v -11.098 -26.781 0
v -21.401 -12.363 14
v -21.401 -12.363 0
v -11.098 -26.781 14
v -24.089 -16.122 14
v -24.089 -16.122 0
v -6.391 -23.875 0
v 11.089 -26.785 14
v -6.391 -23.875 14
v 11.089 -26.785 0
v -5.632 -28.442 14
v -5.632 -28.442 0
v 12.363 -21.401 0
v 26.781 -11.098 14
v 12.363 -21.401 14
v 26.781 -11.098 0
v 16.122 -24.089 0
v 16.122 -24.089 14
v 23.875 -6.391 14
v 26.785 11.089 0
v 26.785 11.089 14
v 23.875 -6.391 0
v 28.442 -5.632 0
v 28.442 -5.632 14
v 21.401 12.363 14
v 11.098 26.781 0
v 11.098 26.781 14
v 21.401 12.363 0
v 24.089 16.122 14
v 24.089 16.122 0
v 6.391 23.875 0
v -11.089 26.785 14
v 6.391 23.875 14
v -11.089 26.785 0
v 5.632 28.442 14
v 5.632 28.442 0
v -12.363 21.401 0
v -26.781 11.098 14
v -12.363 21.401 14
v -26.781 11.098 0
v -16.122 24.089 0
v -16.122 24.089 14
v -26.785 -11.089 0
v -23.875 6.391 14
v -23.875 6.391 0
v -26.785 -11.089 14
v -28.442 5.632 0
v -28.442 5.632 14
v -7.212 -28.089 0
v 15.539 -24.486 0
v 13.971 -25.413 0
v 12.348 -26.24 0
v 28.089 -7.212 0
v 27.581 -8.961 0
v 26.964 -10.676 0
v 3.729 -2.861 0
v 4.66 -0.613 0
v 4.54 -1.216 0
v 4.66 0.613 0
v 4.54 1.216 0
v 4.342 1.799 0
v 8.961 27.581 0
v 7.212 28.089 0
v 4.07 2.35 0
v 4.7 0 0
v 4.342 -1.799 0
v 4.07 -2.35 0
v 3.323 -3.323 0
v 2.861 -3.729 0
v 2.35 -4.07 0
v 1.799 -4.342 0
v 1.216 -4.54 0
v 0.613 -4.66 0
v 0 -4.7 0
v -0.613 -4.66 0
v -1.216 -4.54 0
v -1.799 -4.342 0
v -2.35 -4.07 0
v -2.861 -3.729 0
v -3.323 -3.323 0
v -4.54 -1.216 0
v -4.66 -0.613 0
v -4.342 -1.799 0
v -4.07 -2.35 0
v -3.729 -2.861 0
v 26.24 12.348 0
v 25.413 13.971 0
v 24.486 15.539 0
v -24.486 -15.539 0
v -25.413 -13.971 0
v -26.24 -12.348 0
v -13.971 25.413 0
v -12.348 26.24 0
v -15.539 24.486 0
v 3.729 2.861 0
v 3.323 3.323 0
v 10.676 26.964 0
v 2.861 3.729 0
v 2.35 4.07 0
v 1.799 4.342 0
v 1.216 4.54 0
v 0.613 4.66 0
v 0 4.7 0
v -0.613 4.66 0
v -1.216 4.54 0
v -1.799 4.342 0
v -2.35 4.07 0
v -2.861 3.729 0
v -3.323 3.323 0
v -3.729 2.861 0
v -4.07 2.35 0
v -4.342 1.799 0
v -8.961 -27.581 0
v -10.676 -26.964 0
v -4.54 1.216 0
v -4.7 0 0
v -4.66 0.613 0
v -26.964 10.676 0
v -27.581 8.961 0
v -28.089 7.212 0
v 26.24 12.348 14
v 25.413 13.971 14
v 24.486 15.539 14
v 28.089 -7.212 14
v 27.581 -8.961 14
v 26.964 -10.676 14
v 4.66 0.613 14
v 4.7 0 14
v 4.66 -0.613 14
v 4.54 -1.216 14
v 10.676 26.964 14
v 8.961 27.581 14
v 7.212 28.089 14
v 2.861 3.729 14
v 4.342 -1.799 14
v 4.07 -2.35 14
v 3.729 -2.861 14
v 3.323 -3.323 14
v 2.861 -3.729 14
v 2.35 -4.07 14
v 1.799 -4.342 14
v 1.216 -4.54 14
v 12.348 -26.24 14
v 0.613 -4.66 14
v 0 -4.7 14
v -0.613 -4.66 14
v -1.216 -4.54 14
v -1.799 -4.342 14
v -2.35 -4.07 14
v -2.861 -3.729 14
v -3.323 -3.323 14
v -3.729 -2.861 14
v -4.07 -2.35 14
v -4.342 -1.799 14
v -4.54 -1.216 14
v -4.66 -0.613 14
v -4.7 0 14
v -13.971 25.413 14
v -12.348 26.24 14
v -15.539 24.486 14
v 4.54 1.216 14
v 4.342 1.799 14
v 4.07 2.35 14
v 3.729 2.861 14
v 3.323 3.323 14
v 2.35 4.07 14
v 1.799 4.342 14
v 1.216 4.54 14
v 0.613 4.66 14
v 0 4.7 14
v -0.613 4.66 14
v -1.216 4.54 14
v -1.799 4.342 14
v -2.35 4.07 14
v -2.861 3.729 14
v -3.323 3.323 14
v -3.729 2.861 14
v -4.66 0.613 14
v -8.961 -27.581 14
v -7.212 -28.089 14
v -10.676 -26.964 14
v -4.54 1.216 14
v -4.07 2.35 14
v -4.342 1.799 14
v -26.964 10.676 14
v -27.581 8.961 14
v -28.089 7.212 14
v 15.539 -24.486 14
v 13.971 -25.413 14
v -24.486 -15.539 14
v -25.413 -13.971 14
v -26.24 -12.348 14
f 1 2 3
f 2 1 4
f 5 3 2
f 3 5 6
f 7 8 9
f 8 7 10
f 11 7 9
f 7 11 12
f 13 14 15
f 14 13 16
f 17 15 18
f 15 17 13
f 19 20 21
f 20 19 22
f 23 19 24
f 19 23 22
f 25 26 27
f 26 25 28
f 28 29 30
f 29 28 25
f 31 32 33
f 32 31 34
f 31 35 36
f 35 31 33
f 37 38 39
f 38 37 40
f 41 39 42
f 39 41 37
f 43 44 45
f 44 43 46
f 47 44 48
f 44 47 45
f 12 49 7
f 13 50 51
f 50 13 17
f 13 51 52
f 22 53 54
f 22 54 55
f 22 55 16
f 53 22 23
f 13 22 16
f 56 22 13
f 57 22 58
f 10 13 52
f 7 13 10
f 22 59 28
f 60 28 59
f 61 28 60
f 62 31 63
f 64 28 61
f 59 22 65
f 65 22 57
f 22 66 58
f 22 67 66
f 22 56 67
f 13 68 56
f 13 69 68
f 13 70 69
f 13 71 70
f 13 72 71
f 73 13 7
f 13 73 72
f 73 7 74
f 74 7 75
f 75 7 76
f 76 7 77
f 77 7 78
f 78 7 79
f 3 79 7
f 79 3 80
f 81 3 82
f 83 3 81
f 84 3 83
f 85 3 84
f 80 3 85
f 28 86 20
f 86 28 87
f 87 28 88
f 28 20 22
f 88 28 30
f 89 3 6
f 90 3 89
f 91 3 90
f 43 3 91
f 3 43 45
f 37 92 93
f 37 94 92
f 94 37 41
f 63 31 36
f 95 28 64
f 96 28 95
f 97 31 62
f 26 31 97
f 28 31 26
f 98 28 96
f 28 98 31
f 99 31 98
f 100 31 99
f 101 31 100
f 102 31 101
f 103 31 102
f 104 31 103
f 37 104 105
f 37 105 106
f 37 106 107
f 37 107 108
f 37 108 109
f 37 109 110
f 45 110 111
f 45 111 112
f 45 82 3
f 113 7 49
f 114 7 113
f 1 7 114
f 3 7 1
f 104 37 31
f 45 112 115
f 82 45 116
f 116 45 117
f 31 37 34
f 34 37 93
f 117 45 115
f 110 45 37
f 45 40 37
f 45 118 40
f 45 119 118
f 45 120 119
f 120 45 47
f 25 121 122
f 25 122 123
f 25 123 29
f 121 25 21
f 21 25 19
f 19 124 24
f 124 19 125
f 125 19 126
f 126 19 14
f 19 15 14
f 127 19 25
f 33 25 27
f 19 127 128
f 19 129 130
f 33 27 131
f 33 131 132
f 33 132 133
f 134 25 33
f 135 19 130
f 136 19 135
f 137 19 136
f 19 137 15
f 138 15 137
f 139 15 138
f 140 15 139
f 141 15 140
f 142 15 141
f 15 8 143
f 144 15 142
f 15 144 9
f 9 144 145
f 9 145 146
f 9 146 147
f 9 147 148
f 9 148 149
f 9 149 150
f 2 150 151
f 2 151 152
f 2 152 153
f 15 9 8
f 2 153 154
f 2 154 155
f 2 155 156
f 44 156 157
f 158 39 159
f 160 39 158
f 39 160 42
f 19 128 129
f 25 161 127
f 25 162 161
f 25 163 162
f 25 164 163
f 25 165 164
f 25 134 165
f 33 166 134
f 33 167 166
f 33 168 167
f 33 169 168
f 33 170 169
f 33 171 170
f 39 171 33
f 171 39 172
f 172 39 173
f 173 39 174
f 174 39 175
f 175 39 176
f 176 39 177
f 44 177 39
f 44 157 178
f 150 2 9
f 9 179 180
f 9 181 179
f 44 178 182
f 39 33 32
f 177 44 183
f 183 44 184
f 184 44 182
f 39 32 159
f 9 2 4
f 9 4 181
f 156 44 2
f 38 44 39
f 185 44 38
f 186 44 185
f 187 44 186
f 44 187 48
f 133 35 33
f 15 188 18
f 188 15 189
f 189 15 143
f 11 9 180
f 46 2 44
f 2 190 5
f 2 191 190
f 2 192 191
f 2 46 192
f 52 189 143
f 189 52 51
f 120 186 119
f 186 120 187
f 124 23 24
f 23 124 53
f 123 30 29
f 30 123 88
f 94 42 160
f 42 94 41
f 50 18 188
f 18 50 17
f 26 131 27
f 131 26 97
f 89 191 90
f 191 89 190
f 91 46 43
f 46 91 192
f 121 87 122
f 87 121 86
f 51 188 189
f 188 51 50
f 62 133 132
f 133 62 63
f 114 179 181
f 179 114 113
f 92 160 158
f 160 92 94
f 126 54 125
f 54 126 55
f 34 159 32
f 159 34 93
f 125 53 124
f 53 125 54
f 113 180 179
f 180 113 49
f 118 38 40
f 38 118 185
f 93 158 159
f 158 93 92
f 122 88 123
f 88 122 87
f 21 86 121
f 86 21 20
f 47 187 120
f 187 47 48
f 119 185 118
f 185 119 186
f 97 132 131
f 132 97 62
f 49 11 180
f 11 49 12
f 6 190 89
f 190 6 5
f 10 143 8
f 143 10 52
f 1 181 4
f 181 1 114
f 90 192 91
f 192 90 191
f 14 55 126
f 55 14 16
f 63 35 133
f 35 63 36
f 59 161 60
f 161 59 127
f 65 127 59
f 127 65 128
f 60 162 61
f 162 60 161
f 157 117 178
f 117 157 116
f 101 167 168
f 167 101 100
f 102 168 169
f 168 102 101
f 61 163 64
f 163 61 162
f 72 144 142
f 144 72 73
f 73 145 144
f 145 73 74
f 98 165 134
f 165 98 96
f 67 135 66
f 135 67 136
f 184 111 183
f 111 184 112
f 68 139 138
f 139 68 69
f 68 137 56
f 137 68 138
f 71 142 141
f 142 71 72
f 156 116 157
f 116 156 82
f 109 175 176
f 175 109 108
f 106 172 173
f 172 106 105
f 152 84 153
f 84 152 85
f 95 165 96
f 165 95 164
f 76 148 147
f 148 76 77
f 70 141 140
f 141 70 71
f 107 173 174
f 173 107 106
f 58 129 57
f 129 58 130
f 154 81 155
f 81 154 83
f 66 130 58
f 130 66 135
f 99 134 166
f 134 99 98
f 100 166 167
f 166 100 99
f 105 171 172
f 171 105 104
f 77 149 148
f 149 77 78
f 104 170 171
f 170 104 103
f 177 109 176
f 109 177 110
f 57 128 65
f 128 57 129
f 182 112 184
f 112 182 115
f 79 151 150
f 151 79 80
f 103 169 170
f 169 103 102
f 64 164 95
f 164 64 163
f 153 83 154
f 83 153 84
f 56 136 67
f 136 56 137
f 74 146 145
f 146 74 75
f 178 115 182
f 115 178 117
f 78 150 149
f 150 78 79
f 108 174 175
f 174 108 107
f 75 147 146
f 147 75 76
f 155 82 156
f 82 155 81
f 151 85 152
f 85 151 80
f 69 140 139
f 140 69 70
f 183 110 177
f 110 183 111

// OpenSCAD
// file: ../lib/RatchetLib.scad
/* 
   Parametric ratchet mechanism library
   License: CC BY-NC-SA
   Version: 0.2
   Date: 2010-05-23
   By: rustedrobot

   Changelog:
   2012-02-05 - rustedrobot - added support for slant parameter which slants the ratchet teeth and arm faces to provide a basic interloc
*/


// =======================================================================
module inner_ratchet_ring(ratchet_direction, ring1_diameter, ring1_height, ring1_thickness, ring2_diameter, ring2_height, ring2_thickness, arms, arm_type, arm_head_width, arm_head_length, arm_height, teeth_multiple, tolerance, slant, facets) {
  teeth = arms*teeth_multiple;
  difference() {
    //union() {
    translate([0,0,ring1_height/2]) {
      cylinder(r=ring1_diameter/2, h=ring1_height, center=true, $fn=facets);
    }
    translate([0,0,ring1_height/2]) {
      cylinder(r=ring1_diameter/2-ring1_thickness, h=ring1_height*2, center=true, $fn=facets);
    }
    translate([0,0,0]) {
      //translate([0,0,ring1_height]/2) {
      for(i=[1:teeth]) {
        rotate([0,0,360/teeth*i]) {
          if (arm_type == "straight") {
            if (ratchet_direction == "clockwise") {
              straight_arm_cutout(arm_head_width, arm_head_length, arm_height, ring1_diameter, ring1_thickness, ring1_height, ring2_diameter, ring2_thickness, ring2_height, tolerance, slant, facets);
            }
            if (ratchet_direction == "counter-clockwise") {
              mirror() {
                straight_arm_cutout(arm_head_width, arm_head_length, arm_height, ring1_diameter, ring1_thickness, ring1_height, ring2_diameter, ring2_thickness, ring2_height, tolerance, slant, facets);
              }
            }
          }
          if (arm_type == "curved") {
            echo("Curved arms not yet implemented");
          }
        }
      }
    }
  }
}

module outer_ratchet_ring(ratchet_direction, ring1_diameter, ring1_height, ring1_thickness, ring2_diameter, ring2_height, ring2_thickness, arms, arm_type, arm_head_width, arm_head_length, arm_shaft_width, arm_height, tolerance, slant, facets) {
  union() {
    translate([0,0,ring2_height/2]) {
      difference() {
        cylinder(r=ring2_diameter/2, h=ring2_height, center=true, $fn=facets);
        cylinder(r=ring2_diameter/2-ring2_thickness, h=ring2_height+1, center=true, $fn=facets);
      }
    }

    translate([0,0,arm_height/2]) {
      arms(ratchet_direction, arms, arm_type, arm_head_width, arm_head_length, arm_shaft_width, arm_height, ring1_diameter, ring2_diameter, ring2_height, ring2_thickness, slant, facets);
    }
  }
}

module arms(ratchet_direction, arms, arm_type, arm_head_width, arm_head_length, arm_shaft_width, arm_height, ring1_diameter, ring2_diameter, ring2_height, ring2_thickness, slant, facets) {
  for(i=[1:arms]) {
    rotate([0,0,360/arms*i]) {
      if (arm_type == "straight") {
        if (ratchet_direction == "clockwise") {
          straight_arm(arm_head_width, arm_head_length, arm_shaft_width, arm_height, ring1_diameter, ring2_diameter,ring2_height, ring2_thickness, slant, facets);
        }
        if (ratchet_direction == "counter-clockwise") { 
          mirror() {
            straight_arm(arm_head_width, arm_head_length, arm_shaft_width, arm_height, ring1_diameter, ring2_diameter,ring2_height, ring2_thickness, slant, facets);
          }
        }
      }
      if (arm_type == "curved") {
        echo("Curved arms not yet implemented");
      }
    }
  }
}

module straight_arm(arm_head_width, arm_head_length, arm_shaft_width, arm_height, ring1_diameter, ring2_diameter, ring2_height, ring2_thickness, slant, facets) {
  sidec = ring2_diameter/2-ring2_thickness+arm_head_width/2;
  sideb = ring1_diameter/2;
  sidea = sqrt(abs(pow(sidec, 2) - pow(sideb, 2)));

  slant_move = tan(slant) * arm_height/2;

  difference() {
    translate([0,ring1_diameter/2-arm_head_width,-arm_height/2]) {
      //union() {
      difference() {
        union() {
          cube([sidea,arm_head_width,arm_height]);
          if (slant != 0) {
            translate([0,-arm_head_width+0.001,0]) {
              cube([arm_head_length,arm_head_width,arm_height]);
            }
          }
        }
        translate([0,-slant_move,-0.01]) {
          rotate([90-slant,0,0]) {
            cube([sidea,arm_head_width*10,arm_height*2]);
          }
        }
        translate([0,-arm_head_width*2-slant_move,0]) {
          cube([sidea*2,arm_head_width*2,arm_height*2]);
        }

        translate([arm_head_length+arm_head_width-arm_shaft_width,-0.1,-0.2]) {
          cube([sidea-(arm_head_length+arm_head_width-arm_shaft_width)+0.1,arm_head_width-arm_shaft_width+0.1,arm_height+0.5]);
        }
        translate([arm_head_length+arm_head_width-arm_shaft_width,0,-0.2]) {
          cylinder(r=arm_head_width-arm_shaft_width, h=arm_height+0.5, $fn=facets);
        }
      }
    }
    difference() {
      cylinder(r=ring2_diameter, h=ring2_height+0.1, center=true, $fn=facets);
      cylinder(r=ring2_diameter/2, h=ring2_height*2, center=true, $fn=facets);
    }
  }
}

module straight_arm_cutout(arm_head_width, arm_head_length, arm_height, ring1_diameter, ring1_thickness, ring1_height, ring2_diameter, ring2_thickness, ring2_height, tolerance, slant, facets) {
  sidec = ring2_diameter/2-ring2_thickness+arm_head_width/2;
  sideb = ring1_diameter/2;
  sidea = sqrt(abs(pow(sidec, 2) - pow(sideb, 2)));
  slant_move = tan(slant) * arm_height/2;
  slant_tolerance = tolerance/cos(abs(slant));

  translate([0,ring1_diameter/2-arm_head_width-slant_move-slant_tolerance,-0.01]) {
    rotate([-slant,0,0]) {
      cube([sidea,arm_head_width*2,arm_height*5]);
    }
  }
}
// file: ../lib/common.scad
// Common modules for use across models

epsilon=0.02;

module hollow_cylinder(h,d_inner,d_outer) {
  difference() {
    cylinder(h=h,d=d_outer);
    translate([0,0,-epsilon/2]) {
      cylinder(h=h+epsilon, d=d_inner);
    }
  }
}

module hollow_prism(h, lx_outer, lx_inner, ly_outer, ly_inner) {
  difference() {
    cube([lx_outer, ly_outer, h]);
    translate([(lx_outer-lx_inner)/2,(ly_outer-ly_inner)/2,-epsilon/2]) {
      cube([lx_inner, ly_inner,h+epsilon]);
    }
  }
}

module right_triangle(lx, ly) {
  polygon(points=[[0,0],
                  [lx,0],
                  [0,ly],
                  [0,0]]);
}

// A 2D rectangle with rounded corners
module rounded_rectangle(width, height, radius) {
  r = radius;
  x1 = r;
  y1 = r;
  x2 = width - r;
  y2 = height - r;
  hull() {
    translate([x1, y1, 0]) circle(radius);
    translate([x2, y1, 0]) circle(radius);
    translate([x1, y2, 0]) circle(radius);
    translate([x2, y2, 0]) circle(radius);
  }
}

// 3D rectangle with cylindrical rounded corners. Scale gives an optional flare to the top.
module rounded_prism(width, length, height, radius, scale=1) {
  translate([width/2, length/2]) {
    linear_extrude(height=height, scale=scale) {
      translate([-width/2, -length/2]) {
        rounded_rectangle(width, length, radius);
      }
    }
  }
}

// A squished sphere with the specified radii
module squashed_sphere(h_radius, v_radius) {
  resize([h_radius*2, h_radius*2, v_radius*2]) {
    sphere(r=h_radius);
  }
}

// 3D rectangle with spherical rounded corners
module pillowed_prism(width, length, height, h_radius, v_radius) {
  x1 = h_radius;
  y1 = x1;
  x2 = width - h_radius;
  y2 = length - h_radius;
  hull() {
    translate([x1, y1,  height/2-v_radius]) squashed_sphere(h_radius, v_radius);
    translate([x2, y1,  height/2-v_radius]) squashed_sphere(h_radius, v_radius);
    translate([x1, y2,  height/2-v_radius]) squashed_sphere(h_radius, v_radius);
    translate([x2, y2,  height/2-v_radius]) squashed_sphere(h_radius, v_radius);
    translate([x1, y1, -height/2+v_radius]) squashed_sphere(h_radius, v_radius);
    translate([x2, y1, -height/2+v_radius]) squashed_sphere(h_radius, v_radius);
    translate([x1, y2, -height/2+v_radius]) squashed_sphere(h_radius, v_radius);
    translate([x2, y2, -height/2+v_radius]) squashed_sphere(h_radius, v_radius);
  }
}

// Returns a volume that contains all of the points above or below the
// specified z
module xy(above, below)
{
  d = 10000;
  if (below == undef)
    translate([0,0,above+d/2]) cube([d,d,d] ,center=true);
  else
    translate([0,0,below-d/2]) cube([d,d,d], center=true);
}

// Lays things out in a line with labels
// TODO: Lay them out in a grid instead
module display(w, l=10, padding=2) {
  for (n = [0:2:$children-1]) {
    translate([(w + padding) * n/2, 0, 0]) {
      translate([0, l, 0]) {
        children(n+1);
      }
      color([0,0,0])
        children(n);
    }
  }
}

module quarter_cylinder(r, h) {
  difference() {
    translate([0,0,h/2]) {
      cylinder(r=r, h=h, center=true);
    }
    translate([-r*2-epsilon,-r*2,-epsilon]) {
      cube([r*2,r*4,h*2]);
    }
    translate([-r*2-epsilon,-r*2,-epsilon]) {
      cube([r*4,r*2,h*2]);
    }

  }
}

function bit_test(val, bit) = floor(val / (pow(2,bit))) % 2;

function inches(in) = in * 25.4;
// main file
include <../lib/common.scad>
use <../lib/RatchetLib.scad>;

$fn = 100;

extrusion_width = 0.4;
layer_height = 0.2;

// Caps
cap_thickness = 4;
cap_dimple_thickness = 1; // These mate with the sockets
cap_clearance_hole_d = 5.5;
cap_counterbore_thickness = 3;
cap_counterbore_d = 9;
flange_width = 25;
flange_thickness = 4;
flanges = -1;
flange_hole_diameter = 3;

// inner (teeth) ring
inner_ring_diameter=60;		// outer diameter of the inner ring
inner_ring_height=17;		// height of the inner ring

// outer (arms) ring
// outer_ring_diameter=110;		// outer diameter of the outer ring
///outer_ring_height=21;		// height of the outer ring
outer_ring_thickness=4;		// thickness of the outer ring
//outer_ring_brim_thickness = 2;

// arms for outer ring (and cutting ratchet teeth on inner ring)
arms=8;					// total number of radially symmetric arms
tooth_multiplier = 1;    // How many teeth there are per arm
axle_d = 12;
// arm_l = 15;
arm_w = 5;
arm_h = inner_ring_height;
arm_bevel = 20;

// spring arms
spring_thickness = extrusion_width * 2;

// sockets
socket_thickness=3;


// Computed values
// Make enough space for the arms to swing out without hitting the sockets
arm_clearance = 2.5;
outer_ring_r = (inner_ring_diameter / 2) 
  + arm_w + spring_thickness 
  + axle_d
  + socket_thickness
  + outer_ring_thickness
  + arm_clearance;
outer_ring_diameter = outer_ring_r * 2;

// Make the outer ring high enough to accomodate the cap
outer_ring_height = inner_ring_height + (cap_dimple_thickness * 2) + (layer_height * 2);

// Make the brim wide enough not to interfere with the arms
outer_ring_brim_w = axle_d / 2;

// Brim goes all the way to the top
outer_ring_brim_thickness = outer_ring_height;


// =======================================================================


/* module wedge( */
/*   theta1 = 0, */
/*   theta2 = 180, */
/*   r = 10, */
/*   $fn = $fn) { */
/*   points = [ */
/*     [0, 0], */
/*     for (a = [theta1:(theta2-theta1)/$fn:theta2]) */
/*       [r * cos(a), r * sin(a)] */
/*     , [0,0]]; */
/*   polygon(points=points); */
/* } */

// Set the arm length based on what gives a 90-degree power transfer angle
function optimimum_arm_length(
  outer_ring_diameter = outer_ring_diameter,
  outer_ring_thickness = outer_ring_thickness,
  axle_d = axle_d,
  arm_w = arm_w
  ) =
  let (c = (outer_ring_diameter / 2) - outer_ring_thickness - (axle_d / 2),
       a = (inner_ring_diameter / 2) - (arm_w / 2))
  sqrt((c * c) - (a * a)) - (axle_d / 2);

arm_l = optimimum_arm_length();

module arm (
  axle_d = axle_d,
  arm_l = arm_l,
  arm_w = arm_w,
  arm_h = arm_h,
  arm_bevel = arm_bevel) {
  union() {
    axle_r = axle_d / 2;
    // axle
    cylinder(h = arm_h, d = axle_d);
    // arm
    linear_extrude(height=arm_h) {
      polygon(points = [[arm_w/2, 0],
                        [arm_w/2, axle_r + arm_l + (arm_w * sin(arm_bevel))],
                        [-arm_w/2, axle_r + arm_l],
                        [-arm_w/2, 0]]);
    }
  }
}

// The angle at which the arm is closest to pointing to the center
function min_rotation(
  outer_ring_diameter = outer_ring_diameter,
  outer_ring_thickness = outer_ring_thickness,
  inner_ring_diameter = inner_ring_diameter,
  axle_d = axle_d,
  arm_l = arm_l,
  arm_w = arm_w,
  arm_h = arm_h,
  arm_bevel = arm_bevel) = 
  let (inner_ring_r = inner_ring_diameter / 2,
       outer_ring_r = outer_ring_diameter / 2,
       axle_r = axle_d / 2,
       a = inner_ring_r,
       b1 = arm_l + axle_r,
       b2 = arm_w / 2,
       b = sqrt((b1 * b1) + (b2 * b2)),
       c = outer_ring_r - outer_ring_thickness - axle_r,
       arm_angle = atan2(arm_w/2, arm_l + axle_r))
  acos(((b * b) + (c * c) - (a * a)) / (2 * b * c))- arm_angle;

function max_rotation(
  outer_ring_diameter = outer_ring_diameter,
  outer_ring_thickness = outer_ring_thickness,
  inner_ring_diameter = inner_ring_diameter,
  axle_d = axle_d,
  arm_l = arm_l,
  arm_w = arm_w,
  arm_h = arm_h,
  arm_bevel = arm_bevel) = 
  let (inner_ring_r = inner_ring_diameter / 2,
       outer_ring_r = outer_ring_diameter / 2,
       axle_r = axle_d / 2,
       a = inner_ring_r,
       b1 = arm_l + axle_r + (arm_w * sin(arm_bevel)),
       b2 = arm_w / 2,
       b = sqrt((b1 * b1) + (b2 * b2)),
       c = outer_ring_r - outer_ring_thickness - axle_r,
       arm_angle = atan2(arm_w/2, arm_l + axle_r + (arm_w * sin(arm_bevel))))
  acos(((b * b) + (c * c) - (a * a)) / (2 * b * c)) + arm_angle;

module nth_axle_transform(
  n, 
  arms=arms,
  outer_ring_diameter = outer_ring_diameter,
  outer_ring_thickness = outer_ring_thickness,
  axle_d=axle_d) {
  
  alpha = n * (360 / arms);
  rotate(alpha) {
    translate([0, -((outer_ring_diameter / 2) - outer_ring_thickness - (axle_d / 2)), 0]) {
      children();
    }
  }
}

module outer(
  axle_d = axle_d,
  arm_l = arm_l,
  arm_w = arm_w,
  arm_h = arm_h,
  arm_bevel = arm_bevel,
  socket_thickness = socket_thickness) {

  outer_ring_r = outer_ring_diameter / 2;
  axle_r = axle_d / 2;
  arm_center_offset = outer_ring_r - axle_d/2 - outer_ring_thickness;

  difference() {
    union() {
      color([1, 0, 0]) {
        union() {
          // Outer wall
          difference() {
            cylinder(d=outer_ring_diameter, h=outer_ring_height);
            translate([0,0,-1])
              cylinder(r=outer_ring_r-outer_ring_thickness, h=outer_ring_height + 2);
          }
          // base reinforcing brim
          difference() {
            cylinder(d = outer_ring_diameter, h = outer_ring_brim_thickness);
            translate([0, 0, -1]) {
              cylinder(r = outer_ring_r - outer_ring_thickness - outer_ring_brim_w, h = outer_ring_brim_thickness + 2);
            }
          }
        }
      }

      color([0, 0, 1]) {
        union() {
          // Spring
          for (n = [0:arms]) {
            nth_axle_transform(n) {

              rotate(min_rotation() - atan2(axle_r + socket_thickness - (arm_w / 2), arm_l + axle_r) - 90) {
                translate([-arm_l, -axle_d/2-socket_thickness, 0]) {
                  cube([arm_l, spring_thickness, outer_ring_height]);
                }
              }
            }
          }
          difference() {
            // Socket body
            for (n = [0:arms]) {
              nth_axle_transform(n) {
                cylinder(d = axle_d + (socket_thickness * 2), h=outer_ring_height);
              }
            }
            // Arm cutouts
            for (n = [0:arms]) {
              nth_axle_transform(n) {
                union() {
                  translate([0,0,-1]) {
                    rotate(min_rotation())
                      arm(arm_h = outer_ring_height + 2,
                          arm_w = arm_w + (extrusion_width * 2));
                  }
                  translate([0,0,-1]) {
                    rotate(max_rotation())
                      arm(arm_h = outer_ring_height + 2, 
                          arm_w = arm_w + (spring_thickness * 2));
                  }
                }
              }
            }
          }
        }
      }
    }
    //  Socket bores
    for (n = [0:arms]) {
      nth_axle_transform(n) {
        translate([0, 0, -1]) {
          cylinder(d = axle_d + (extrusion_width * 2), h=outer_ring_height + 2);
        }
      }
    }
  }
}


module nth_arm(
  n = 0,
  arms = arms,
  rotation=min_rotation(),
  arm_h = arm_h,
  arm_l = arm_l,
  arm_w = arm_w) {

  nth_axle_transform(n, arms=arms) {
    rotate([0, 0, rotation]) {
      arm(
        arm_h = arm_h,
        arm_l = arm_l,
        arm_w = arm_w);
    }
  }
}

module inner(
  inner_ring_diameter = inner_ring_diameter,
  inner_ring_height = inner_ring_height) {
  
  inner_ring_r = inner_ring_diameter / 2;
  
  color([1, 1, 0]) {
    difference() {
      cylinder(r = inner_ring_r, h = inner_ring_height);
      translate([0, 0, -1]) {
        for (n = [0:arms*tooth_multiplier]) {
          nth_arm(n,
                  arms = arms * tooth_multiplier,
                  arm_h = inner_ring_height + 2, 
                  arm_l = arm_l + extrusion_width,
                  arm_w = arm_w + extrusion_width * 2);
        }
      }
    }
  }
}

module cap(
  outer_ring_diameter = outer_ring_diameter,
  outer_ring_thickness = outer_ring_thickness,
  outer_ring_brim_thickness = outer_ring_brim_thickness,
  cap_thickness = cap_thickness,
  cap_dimple_thickness = cap_dimple_thickness,
  cap_clearance_hole_d = cap_clearance_hole_d,
  cap_counterbore_d = cap_counterbore_d,
  cap_counterbore_thickness = cap_counterbore_thickness,
  flanges = flanges,
  flange_width = flange_width,
  flange_thickness = flange_thickness,
  flange_hole_diameter = flange_hole_diameter
  ) {
  difference() {
    union() {
      cylinder(d = outer_ring_diameter, h = cap_thickness);
      // nubs
      for (n = [0:arms]) {
        nth_axle_transform(n) {
          cylinder(d=axle_d, h = cap_dimple_thickness + cap_thickness);
        }
      }
      // Flanges
      for (angle = [0:360/flanges:360]) {
        rotate([0,0,angle]) {
          difference() {
            translate([0, -flange_width / 2, 0]) {
              difference() {
                cube([flange_width + outer_ring_diameter / 2, flange_width,  flange_thickness]);
                translate([(flange_width + outer_ring_diameter)/2, flange_width/2, -0.05]) {
                  cylinder(d=flange_hole_diameter, h = flange_thickness + 0.1);
                }
              }
            }
            translate([0,0,-0.05]) {
              cylinder(d=outer_ring_diameter, h = outer_ring_height + 0.1);
            }
          }
        }
      }
    }
    for (n = [0:arms]) {
      rotate((n+0.5)*360/arms) {
        translate([0, 
                   (outer_ring_diameter/2) 
                   + outer_ring_thickness 
                   - (outer_ring_brim_thickness/2), 
                   -1]) {
          union() {
            cylinder(h=cap_thickness + 2, d = cap_clearance_hole_d);
            cylinder(d1 = cap_counterbore_d, 
                     d2 = cap_clearance_hole_d,
                     h = cap_counterbore_thickness);
          }
        }
      }
    }

  }
}

module cap_with_holes() {
  difference() {
    union() {
      cap();
      cylinder(h=cap_thickness+cap_dimple_thickness, d = 28);
    }
    translate([0,0,-1]) {
      cylinder(h=cap_thickness + cap_dimple_thickness + 2, d = 24);
    }
     
  }
}


union() {
  difference() {
    washer_thickness = 1.5;
    inner(inner_ring_height = inner_ring_height - 2 * washer_thickness);
    difference() {
      cylinder(h=inner_ring_height+1, d = inner_ring_diameter + 1);
      cylinder(h=inner_ring_height+1, d = inner_ring_diameter - 2);
    }
    // Center bore
    translate([0,0,-1]) {
      cylinder(h=inner_ring_height + 2, d = 9 + extrusion_width, $fn = 48);
    }
  }
  /*
  outer();
  for (n = [0:arms]) {
    nth_arm(n, rotation=min_rotation());
  }
  translate([0, 0, -cap_thickness])
    cap_with_holes();
    */
}



// outer();

// arm();
